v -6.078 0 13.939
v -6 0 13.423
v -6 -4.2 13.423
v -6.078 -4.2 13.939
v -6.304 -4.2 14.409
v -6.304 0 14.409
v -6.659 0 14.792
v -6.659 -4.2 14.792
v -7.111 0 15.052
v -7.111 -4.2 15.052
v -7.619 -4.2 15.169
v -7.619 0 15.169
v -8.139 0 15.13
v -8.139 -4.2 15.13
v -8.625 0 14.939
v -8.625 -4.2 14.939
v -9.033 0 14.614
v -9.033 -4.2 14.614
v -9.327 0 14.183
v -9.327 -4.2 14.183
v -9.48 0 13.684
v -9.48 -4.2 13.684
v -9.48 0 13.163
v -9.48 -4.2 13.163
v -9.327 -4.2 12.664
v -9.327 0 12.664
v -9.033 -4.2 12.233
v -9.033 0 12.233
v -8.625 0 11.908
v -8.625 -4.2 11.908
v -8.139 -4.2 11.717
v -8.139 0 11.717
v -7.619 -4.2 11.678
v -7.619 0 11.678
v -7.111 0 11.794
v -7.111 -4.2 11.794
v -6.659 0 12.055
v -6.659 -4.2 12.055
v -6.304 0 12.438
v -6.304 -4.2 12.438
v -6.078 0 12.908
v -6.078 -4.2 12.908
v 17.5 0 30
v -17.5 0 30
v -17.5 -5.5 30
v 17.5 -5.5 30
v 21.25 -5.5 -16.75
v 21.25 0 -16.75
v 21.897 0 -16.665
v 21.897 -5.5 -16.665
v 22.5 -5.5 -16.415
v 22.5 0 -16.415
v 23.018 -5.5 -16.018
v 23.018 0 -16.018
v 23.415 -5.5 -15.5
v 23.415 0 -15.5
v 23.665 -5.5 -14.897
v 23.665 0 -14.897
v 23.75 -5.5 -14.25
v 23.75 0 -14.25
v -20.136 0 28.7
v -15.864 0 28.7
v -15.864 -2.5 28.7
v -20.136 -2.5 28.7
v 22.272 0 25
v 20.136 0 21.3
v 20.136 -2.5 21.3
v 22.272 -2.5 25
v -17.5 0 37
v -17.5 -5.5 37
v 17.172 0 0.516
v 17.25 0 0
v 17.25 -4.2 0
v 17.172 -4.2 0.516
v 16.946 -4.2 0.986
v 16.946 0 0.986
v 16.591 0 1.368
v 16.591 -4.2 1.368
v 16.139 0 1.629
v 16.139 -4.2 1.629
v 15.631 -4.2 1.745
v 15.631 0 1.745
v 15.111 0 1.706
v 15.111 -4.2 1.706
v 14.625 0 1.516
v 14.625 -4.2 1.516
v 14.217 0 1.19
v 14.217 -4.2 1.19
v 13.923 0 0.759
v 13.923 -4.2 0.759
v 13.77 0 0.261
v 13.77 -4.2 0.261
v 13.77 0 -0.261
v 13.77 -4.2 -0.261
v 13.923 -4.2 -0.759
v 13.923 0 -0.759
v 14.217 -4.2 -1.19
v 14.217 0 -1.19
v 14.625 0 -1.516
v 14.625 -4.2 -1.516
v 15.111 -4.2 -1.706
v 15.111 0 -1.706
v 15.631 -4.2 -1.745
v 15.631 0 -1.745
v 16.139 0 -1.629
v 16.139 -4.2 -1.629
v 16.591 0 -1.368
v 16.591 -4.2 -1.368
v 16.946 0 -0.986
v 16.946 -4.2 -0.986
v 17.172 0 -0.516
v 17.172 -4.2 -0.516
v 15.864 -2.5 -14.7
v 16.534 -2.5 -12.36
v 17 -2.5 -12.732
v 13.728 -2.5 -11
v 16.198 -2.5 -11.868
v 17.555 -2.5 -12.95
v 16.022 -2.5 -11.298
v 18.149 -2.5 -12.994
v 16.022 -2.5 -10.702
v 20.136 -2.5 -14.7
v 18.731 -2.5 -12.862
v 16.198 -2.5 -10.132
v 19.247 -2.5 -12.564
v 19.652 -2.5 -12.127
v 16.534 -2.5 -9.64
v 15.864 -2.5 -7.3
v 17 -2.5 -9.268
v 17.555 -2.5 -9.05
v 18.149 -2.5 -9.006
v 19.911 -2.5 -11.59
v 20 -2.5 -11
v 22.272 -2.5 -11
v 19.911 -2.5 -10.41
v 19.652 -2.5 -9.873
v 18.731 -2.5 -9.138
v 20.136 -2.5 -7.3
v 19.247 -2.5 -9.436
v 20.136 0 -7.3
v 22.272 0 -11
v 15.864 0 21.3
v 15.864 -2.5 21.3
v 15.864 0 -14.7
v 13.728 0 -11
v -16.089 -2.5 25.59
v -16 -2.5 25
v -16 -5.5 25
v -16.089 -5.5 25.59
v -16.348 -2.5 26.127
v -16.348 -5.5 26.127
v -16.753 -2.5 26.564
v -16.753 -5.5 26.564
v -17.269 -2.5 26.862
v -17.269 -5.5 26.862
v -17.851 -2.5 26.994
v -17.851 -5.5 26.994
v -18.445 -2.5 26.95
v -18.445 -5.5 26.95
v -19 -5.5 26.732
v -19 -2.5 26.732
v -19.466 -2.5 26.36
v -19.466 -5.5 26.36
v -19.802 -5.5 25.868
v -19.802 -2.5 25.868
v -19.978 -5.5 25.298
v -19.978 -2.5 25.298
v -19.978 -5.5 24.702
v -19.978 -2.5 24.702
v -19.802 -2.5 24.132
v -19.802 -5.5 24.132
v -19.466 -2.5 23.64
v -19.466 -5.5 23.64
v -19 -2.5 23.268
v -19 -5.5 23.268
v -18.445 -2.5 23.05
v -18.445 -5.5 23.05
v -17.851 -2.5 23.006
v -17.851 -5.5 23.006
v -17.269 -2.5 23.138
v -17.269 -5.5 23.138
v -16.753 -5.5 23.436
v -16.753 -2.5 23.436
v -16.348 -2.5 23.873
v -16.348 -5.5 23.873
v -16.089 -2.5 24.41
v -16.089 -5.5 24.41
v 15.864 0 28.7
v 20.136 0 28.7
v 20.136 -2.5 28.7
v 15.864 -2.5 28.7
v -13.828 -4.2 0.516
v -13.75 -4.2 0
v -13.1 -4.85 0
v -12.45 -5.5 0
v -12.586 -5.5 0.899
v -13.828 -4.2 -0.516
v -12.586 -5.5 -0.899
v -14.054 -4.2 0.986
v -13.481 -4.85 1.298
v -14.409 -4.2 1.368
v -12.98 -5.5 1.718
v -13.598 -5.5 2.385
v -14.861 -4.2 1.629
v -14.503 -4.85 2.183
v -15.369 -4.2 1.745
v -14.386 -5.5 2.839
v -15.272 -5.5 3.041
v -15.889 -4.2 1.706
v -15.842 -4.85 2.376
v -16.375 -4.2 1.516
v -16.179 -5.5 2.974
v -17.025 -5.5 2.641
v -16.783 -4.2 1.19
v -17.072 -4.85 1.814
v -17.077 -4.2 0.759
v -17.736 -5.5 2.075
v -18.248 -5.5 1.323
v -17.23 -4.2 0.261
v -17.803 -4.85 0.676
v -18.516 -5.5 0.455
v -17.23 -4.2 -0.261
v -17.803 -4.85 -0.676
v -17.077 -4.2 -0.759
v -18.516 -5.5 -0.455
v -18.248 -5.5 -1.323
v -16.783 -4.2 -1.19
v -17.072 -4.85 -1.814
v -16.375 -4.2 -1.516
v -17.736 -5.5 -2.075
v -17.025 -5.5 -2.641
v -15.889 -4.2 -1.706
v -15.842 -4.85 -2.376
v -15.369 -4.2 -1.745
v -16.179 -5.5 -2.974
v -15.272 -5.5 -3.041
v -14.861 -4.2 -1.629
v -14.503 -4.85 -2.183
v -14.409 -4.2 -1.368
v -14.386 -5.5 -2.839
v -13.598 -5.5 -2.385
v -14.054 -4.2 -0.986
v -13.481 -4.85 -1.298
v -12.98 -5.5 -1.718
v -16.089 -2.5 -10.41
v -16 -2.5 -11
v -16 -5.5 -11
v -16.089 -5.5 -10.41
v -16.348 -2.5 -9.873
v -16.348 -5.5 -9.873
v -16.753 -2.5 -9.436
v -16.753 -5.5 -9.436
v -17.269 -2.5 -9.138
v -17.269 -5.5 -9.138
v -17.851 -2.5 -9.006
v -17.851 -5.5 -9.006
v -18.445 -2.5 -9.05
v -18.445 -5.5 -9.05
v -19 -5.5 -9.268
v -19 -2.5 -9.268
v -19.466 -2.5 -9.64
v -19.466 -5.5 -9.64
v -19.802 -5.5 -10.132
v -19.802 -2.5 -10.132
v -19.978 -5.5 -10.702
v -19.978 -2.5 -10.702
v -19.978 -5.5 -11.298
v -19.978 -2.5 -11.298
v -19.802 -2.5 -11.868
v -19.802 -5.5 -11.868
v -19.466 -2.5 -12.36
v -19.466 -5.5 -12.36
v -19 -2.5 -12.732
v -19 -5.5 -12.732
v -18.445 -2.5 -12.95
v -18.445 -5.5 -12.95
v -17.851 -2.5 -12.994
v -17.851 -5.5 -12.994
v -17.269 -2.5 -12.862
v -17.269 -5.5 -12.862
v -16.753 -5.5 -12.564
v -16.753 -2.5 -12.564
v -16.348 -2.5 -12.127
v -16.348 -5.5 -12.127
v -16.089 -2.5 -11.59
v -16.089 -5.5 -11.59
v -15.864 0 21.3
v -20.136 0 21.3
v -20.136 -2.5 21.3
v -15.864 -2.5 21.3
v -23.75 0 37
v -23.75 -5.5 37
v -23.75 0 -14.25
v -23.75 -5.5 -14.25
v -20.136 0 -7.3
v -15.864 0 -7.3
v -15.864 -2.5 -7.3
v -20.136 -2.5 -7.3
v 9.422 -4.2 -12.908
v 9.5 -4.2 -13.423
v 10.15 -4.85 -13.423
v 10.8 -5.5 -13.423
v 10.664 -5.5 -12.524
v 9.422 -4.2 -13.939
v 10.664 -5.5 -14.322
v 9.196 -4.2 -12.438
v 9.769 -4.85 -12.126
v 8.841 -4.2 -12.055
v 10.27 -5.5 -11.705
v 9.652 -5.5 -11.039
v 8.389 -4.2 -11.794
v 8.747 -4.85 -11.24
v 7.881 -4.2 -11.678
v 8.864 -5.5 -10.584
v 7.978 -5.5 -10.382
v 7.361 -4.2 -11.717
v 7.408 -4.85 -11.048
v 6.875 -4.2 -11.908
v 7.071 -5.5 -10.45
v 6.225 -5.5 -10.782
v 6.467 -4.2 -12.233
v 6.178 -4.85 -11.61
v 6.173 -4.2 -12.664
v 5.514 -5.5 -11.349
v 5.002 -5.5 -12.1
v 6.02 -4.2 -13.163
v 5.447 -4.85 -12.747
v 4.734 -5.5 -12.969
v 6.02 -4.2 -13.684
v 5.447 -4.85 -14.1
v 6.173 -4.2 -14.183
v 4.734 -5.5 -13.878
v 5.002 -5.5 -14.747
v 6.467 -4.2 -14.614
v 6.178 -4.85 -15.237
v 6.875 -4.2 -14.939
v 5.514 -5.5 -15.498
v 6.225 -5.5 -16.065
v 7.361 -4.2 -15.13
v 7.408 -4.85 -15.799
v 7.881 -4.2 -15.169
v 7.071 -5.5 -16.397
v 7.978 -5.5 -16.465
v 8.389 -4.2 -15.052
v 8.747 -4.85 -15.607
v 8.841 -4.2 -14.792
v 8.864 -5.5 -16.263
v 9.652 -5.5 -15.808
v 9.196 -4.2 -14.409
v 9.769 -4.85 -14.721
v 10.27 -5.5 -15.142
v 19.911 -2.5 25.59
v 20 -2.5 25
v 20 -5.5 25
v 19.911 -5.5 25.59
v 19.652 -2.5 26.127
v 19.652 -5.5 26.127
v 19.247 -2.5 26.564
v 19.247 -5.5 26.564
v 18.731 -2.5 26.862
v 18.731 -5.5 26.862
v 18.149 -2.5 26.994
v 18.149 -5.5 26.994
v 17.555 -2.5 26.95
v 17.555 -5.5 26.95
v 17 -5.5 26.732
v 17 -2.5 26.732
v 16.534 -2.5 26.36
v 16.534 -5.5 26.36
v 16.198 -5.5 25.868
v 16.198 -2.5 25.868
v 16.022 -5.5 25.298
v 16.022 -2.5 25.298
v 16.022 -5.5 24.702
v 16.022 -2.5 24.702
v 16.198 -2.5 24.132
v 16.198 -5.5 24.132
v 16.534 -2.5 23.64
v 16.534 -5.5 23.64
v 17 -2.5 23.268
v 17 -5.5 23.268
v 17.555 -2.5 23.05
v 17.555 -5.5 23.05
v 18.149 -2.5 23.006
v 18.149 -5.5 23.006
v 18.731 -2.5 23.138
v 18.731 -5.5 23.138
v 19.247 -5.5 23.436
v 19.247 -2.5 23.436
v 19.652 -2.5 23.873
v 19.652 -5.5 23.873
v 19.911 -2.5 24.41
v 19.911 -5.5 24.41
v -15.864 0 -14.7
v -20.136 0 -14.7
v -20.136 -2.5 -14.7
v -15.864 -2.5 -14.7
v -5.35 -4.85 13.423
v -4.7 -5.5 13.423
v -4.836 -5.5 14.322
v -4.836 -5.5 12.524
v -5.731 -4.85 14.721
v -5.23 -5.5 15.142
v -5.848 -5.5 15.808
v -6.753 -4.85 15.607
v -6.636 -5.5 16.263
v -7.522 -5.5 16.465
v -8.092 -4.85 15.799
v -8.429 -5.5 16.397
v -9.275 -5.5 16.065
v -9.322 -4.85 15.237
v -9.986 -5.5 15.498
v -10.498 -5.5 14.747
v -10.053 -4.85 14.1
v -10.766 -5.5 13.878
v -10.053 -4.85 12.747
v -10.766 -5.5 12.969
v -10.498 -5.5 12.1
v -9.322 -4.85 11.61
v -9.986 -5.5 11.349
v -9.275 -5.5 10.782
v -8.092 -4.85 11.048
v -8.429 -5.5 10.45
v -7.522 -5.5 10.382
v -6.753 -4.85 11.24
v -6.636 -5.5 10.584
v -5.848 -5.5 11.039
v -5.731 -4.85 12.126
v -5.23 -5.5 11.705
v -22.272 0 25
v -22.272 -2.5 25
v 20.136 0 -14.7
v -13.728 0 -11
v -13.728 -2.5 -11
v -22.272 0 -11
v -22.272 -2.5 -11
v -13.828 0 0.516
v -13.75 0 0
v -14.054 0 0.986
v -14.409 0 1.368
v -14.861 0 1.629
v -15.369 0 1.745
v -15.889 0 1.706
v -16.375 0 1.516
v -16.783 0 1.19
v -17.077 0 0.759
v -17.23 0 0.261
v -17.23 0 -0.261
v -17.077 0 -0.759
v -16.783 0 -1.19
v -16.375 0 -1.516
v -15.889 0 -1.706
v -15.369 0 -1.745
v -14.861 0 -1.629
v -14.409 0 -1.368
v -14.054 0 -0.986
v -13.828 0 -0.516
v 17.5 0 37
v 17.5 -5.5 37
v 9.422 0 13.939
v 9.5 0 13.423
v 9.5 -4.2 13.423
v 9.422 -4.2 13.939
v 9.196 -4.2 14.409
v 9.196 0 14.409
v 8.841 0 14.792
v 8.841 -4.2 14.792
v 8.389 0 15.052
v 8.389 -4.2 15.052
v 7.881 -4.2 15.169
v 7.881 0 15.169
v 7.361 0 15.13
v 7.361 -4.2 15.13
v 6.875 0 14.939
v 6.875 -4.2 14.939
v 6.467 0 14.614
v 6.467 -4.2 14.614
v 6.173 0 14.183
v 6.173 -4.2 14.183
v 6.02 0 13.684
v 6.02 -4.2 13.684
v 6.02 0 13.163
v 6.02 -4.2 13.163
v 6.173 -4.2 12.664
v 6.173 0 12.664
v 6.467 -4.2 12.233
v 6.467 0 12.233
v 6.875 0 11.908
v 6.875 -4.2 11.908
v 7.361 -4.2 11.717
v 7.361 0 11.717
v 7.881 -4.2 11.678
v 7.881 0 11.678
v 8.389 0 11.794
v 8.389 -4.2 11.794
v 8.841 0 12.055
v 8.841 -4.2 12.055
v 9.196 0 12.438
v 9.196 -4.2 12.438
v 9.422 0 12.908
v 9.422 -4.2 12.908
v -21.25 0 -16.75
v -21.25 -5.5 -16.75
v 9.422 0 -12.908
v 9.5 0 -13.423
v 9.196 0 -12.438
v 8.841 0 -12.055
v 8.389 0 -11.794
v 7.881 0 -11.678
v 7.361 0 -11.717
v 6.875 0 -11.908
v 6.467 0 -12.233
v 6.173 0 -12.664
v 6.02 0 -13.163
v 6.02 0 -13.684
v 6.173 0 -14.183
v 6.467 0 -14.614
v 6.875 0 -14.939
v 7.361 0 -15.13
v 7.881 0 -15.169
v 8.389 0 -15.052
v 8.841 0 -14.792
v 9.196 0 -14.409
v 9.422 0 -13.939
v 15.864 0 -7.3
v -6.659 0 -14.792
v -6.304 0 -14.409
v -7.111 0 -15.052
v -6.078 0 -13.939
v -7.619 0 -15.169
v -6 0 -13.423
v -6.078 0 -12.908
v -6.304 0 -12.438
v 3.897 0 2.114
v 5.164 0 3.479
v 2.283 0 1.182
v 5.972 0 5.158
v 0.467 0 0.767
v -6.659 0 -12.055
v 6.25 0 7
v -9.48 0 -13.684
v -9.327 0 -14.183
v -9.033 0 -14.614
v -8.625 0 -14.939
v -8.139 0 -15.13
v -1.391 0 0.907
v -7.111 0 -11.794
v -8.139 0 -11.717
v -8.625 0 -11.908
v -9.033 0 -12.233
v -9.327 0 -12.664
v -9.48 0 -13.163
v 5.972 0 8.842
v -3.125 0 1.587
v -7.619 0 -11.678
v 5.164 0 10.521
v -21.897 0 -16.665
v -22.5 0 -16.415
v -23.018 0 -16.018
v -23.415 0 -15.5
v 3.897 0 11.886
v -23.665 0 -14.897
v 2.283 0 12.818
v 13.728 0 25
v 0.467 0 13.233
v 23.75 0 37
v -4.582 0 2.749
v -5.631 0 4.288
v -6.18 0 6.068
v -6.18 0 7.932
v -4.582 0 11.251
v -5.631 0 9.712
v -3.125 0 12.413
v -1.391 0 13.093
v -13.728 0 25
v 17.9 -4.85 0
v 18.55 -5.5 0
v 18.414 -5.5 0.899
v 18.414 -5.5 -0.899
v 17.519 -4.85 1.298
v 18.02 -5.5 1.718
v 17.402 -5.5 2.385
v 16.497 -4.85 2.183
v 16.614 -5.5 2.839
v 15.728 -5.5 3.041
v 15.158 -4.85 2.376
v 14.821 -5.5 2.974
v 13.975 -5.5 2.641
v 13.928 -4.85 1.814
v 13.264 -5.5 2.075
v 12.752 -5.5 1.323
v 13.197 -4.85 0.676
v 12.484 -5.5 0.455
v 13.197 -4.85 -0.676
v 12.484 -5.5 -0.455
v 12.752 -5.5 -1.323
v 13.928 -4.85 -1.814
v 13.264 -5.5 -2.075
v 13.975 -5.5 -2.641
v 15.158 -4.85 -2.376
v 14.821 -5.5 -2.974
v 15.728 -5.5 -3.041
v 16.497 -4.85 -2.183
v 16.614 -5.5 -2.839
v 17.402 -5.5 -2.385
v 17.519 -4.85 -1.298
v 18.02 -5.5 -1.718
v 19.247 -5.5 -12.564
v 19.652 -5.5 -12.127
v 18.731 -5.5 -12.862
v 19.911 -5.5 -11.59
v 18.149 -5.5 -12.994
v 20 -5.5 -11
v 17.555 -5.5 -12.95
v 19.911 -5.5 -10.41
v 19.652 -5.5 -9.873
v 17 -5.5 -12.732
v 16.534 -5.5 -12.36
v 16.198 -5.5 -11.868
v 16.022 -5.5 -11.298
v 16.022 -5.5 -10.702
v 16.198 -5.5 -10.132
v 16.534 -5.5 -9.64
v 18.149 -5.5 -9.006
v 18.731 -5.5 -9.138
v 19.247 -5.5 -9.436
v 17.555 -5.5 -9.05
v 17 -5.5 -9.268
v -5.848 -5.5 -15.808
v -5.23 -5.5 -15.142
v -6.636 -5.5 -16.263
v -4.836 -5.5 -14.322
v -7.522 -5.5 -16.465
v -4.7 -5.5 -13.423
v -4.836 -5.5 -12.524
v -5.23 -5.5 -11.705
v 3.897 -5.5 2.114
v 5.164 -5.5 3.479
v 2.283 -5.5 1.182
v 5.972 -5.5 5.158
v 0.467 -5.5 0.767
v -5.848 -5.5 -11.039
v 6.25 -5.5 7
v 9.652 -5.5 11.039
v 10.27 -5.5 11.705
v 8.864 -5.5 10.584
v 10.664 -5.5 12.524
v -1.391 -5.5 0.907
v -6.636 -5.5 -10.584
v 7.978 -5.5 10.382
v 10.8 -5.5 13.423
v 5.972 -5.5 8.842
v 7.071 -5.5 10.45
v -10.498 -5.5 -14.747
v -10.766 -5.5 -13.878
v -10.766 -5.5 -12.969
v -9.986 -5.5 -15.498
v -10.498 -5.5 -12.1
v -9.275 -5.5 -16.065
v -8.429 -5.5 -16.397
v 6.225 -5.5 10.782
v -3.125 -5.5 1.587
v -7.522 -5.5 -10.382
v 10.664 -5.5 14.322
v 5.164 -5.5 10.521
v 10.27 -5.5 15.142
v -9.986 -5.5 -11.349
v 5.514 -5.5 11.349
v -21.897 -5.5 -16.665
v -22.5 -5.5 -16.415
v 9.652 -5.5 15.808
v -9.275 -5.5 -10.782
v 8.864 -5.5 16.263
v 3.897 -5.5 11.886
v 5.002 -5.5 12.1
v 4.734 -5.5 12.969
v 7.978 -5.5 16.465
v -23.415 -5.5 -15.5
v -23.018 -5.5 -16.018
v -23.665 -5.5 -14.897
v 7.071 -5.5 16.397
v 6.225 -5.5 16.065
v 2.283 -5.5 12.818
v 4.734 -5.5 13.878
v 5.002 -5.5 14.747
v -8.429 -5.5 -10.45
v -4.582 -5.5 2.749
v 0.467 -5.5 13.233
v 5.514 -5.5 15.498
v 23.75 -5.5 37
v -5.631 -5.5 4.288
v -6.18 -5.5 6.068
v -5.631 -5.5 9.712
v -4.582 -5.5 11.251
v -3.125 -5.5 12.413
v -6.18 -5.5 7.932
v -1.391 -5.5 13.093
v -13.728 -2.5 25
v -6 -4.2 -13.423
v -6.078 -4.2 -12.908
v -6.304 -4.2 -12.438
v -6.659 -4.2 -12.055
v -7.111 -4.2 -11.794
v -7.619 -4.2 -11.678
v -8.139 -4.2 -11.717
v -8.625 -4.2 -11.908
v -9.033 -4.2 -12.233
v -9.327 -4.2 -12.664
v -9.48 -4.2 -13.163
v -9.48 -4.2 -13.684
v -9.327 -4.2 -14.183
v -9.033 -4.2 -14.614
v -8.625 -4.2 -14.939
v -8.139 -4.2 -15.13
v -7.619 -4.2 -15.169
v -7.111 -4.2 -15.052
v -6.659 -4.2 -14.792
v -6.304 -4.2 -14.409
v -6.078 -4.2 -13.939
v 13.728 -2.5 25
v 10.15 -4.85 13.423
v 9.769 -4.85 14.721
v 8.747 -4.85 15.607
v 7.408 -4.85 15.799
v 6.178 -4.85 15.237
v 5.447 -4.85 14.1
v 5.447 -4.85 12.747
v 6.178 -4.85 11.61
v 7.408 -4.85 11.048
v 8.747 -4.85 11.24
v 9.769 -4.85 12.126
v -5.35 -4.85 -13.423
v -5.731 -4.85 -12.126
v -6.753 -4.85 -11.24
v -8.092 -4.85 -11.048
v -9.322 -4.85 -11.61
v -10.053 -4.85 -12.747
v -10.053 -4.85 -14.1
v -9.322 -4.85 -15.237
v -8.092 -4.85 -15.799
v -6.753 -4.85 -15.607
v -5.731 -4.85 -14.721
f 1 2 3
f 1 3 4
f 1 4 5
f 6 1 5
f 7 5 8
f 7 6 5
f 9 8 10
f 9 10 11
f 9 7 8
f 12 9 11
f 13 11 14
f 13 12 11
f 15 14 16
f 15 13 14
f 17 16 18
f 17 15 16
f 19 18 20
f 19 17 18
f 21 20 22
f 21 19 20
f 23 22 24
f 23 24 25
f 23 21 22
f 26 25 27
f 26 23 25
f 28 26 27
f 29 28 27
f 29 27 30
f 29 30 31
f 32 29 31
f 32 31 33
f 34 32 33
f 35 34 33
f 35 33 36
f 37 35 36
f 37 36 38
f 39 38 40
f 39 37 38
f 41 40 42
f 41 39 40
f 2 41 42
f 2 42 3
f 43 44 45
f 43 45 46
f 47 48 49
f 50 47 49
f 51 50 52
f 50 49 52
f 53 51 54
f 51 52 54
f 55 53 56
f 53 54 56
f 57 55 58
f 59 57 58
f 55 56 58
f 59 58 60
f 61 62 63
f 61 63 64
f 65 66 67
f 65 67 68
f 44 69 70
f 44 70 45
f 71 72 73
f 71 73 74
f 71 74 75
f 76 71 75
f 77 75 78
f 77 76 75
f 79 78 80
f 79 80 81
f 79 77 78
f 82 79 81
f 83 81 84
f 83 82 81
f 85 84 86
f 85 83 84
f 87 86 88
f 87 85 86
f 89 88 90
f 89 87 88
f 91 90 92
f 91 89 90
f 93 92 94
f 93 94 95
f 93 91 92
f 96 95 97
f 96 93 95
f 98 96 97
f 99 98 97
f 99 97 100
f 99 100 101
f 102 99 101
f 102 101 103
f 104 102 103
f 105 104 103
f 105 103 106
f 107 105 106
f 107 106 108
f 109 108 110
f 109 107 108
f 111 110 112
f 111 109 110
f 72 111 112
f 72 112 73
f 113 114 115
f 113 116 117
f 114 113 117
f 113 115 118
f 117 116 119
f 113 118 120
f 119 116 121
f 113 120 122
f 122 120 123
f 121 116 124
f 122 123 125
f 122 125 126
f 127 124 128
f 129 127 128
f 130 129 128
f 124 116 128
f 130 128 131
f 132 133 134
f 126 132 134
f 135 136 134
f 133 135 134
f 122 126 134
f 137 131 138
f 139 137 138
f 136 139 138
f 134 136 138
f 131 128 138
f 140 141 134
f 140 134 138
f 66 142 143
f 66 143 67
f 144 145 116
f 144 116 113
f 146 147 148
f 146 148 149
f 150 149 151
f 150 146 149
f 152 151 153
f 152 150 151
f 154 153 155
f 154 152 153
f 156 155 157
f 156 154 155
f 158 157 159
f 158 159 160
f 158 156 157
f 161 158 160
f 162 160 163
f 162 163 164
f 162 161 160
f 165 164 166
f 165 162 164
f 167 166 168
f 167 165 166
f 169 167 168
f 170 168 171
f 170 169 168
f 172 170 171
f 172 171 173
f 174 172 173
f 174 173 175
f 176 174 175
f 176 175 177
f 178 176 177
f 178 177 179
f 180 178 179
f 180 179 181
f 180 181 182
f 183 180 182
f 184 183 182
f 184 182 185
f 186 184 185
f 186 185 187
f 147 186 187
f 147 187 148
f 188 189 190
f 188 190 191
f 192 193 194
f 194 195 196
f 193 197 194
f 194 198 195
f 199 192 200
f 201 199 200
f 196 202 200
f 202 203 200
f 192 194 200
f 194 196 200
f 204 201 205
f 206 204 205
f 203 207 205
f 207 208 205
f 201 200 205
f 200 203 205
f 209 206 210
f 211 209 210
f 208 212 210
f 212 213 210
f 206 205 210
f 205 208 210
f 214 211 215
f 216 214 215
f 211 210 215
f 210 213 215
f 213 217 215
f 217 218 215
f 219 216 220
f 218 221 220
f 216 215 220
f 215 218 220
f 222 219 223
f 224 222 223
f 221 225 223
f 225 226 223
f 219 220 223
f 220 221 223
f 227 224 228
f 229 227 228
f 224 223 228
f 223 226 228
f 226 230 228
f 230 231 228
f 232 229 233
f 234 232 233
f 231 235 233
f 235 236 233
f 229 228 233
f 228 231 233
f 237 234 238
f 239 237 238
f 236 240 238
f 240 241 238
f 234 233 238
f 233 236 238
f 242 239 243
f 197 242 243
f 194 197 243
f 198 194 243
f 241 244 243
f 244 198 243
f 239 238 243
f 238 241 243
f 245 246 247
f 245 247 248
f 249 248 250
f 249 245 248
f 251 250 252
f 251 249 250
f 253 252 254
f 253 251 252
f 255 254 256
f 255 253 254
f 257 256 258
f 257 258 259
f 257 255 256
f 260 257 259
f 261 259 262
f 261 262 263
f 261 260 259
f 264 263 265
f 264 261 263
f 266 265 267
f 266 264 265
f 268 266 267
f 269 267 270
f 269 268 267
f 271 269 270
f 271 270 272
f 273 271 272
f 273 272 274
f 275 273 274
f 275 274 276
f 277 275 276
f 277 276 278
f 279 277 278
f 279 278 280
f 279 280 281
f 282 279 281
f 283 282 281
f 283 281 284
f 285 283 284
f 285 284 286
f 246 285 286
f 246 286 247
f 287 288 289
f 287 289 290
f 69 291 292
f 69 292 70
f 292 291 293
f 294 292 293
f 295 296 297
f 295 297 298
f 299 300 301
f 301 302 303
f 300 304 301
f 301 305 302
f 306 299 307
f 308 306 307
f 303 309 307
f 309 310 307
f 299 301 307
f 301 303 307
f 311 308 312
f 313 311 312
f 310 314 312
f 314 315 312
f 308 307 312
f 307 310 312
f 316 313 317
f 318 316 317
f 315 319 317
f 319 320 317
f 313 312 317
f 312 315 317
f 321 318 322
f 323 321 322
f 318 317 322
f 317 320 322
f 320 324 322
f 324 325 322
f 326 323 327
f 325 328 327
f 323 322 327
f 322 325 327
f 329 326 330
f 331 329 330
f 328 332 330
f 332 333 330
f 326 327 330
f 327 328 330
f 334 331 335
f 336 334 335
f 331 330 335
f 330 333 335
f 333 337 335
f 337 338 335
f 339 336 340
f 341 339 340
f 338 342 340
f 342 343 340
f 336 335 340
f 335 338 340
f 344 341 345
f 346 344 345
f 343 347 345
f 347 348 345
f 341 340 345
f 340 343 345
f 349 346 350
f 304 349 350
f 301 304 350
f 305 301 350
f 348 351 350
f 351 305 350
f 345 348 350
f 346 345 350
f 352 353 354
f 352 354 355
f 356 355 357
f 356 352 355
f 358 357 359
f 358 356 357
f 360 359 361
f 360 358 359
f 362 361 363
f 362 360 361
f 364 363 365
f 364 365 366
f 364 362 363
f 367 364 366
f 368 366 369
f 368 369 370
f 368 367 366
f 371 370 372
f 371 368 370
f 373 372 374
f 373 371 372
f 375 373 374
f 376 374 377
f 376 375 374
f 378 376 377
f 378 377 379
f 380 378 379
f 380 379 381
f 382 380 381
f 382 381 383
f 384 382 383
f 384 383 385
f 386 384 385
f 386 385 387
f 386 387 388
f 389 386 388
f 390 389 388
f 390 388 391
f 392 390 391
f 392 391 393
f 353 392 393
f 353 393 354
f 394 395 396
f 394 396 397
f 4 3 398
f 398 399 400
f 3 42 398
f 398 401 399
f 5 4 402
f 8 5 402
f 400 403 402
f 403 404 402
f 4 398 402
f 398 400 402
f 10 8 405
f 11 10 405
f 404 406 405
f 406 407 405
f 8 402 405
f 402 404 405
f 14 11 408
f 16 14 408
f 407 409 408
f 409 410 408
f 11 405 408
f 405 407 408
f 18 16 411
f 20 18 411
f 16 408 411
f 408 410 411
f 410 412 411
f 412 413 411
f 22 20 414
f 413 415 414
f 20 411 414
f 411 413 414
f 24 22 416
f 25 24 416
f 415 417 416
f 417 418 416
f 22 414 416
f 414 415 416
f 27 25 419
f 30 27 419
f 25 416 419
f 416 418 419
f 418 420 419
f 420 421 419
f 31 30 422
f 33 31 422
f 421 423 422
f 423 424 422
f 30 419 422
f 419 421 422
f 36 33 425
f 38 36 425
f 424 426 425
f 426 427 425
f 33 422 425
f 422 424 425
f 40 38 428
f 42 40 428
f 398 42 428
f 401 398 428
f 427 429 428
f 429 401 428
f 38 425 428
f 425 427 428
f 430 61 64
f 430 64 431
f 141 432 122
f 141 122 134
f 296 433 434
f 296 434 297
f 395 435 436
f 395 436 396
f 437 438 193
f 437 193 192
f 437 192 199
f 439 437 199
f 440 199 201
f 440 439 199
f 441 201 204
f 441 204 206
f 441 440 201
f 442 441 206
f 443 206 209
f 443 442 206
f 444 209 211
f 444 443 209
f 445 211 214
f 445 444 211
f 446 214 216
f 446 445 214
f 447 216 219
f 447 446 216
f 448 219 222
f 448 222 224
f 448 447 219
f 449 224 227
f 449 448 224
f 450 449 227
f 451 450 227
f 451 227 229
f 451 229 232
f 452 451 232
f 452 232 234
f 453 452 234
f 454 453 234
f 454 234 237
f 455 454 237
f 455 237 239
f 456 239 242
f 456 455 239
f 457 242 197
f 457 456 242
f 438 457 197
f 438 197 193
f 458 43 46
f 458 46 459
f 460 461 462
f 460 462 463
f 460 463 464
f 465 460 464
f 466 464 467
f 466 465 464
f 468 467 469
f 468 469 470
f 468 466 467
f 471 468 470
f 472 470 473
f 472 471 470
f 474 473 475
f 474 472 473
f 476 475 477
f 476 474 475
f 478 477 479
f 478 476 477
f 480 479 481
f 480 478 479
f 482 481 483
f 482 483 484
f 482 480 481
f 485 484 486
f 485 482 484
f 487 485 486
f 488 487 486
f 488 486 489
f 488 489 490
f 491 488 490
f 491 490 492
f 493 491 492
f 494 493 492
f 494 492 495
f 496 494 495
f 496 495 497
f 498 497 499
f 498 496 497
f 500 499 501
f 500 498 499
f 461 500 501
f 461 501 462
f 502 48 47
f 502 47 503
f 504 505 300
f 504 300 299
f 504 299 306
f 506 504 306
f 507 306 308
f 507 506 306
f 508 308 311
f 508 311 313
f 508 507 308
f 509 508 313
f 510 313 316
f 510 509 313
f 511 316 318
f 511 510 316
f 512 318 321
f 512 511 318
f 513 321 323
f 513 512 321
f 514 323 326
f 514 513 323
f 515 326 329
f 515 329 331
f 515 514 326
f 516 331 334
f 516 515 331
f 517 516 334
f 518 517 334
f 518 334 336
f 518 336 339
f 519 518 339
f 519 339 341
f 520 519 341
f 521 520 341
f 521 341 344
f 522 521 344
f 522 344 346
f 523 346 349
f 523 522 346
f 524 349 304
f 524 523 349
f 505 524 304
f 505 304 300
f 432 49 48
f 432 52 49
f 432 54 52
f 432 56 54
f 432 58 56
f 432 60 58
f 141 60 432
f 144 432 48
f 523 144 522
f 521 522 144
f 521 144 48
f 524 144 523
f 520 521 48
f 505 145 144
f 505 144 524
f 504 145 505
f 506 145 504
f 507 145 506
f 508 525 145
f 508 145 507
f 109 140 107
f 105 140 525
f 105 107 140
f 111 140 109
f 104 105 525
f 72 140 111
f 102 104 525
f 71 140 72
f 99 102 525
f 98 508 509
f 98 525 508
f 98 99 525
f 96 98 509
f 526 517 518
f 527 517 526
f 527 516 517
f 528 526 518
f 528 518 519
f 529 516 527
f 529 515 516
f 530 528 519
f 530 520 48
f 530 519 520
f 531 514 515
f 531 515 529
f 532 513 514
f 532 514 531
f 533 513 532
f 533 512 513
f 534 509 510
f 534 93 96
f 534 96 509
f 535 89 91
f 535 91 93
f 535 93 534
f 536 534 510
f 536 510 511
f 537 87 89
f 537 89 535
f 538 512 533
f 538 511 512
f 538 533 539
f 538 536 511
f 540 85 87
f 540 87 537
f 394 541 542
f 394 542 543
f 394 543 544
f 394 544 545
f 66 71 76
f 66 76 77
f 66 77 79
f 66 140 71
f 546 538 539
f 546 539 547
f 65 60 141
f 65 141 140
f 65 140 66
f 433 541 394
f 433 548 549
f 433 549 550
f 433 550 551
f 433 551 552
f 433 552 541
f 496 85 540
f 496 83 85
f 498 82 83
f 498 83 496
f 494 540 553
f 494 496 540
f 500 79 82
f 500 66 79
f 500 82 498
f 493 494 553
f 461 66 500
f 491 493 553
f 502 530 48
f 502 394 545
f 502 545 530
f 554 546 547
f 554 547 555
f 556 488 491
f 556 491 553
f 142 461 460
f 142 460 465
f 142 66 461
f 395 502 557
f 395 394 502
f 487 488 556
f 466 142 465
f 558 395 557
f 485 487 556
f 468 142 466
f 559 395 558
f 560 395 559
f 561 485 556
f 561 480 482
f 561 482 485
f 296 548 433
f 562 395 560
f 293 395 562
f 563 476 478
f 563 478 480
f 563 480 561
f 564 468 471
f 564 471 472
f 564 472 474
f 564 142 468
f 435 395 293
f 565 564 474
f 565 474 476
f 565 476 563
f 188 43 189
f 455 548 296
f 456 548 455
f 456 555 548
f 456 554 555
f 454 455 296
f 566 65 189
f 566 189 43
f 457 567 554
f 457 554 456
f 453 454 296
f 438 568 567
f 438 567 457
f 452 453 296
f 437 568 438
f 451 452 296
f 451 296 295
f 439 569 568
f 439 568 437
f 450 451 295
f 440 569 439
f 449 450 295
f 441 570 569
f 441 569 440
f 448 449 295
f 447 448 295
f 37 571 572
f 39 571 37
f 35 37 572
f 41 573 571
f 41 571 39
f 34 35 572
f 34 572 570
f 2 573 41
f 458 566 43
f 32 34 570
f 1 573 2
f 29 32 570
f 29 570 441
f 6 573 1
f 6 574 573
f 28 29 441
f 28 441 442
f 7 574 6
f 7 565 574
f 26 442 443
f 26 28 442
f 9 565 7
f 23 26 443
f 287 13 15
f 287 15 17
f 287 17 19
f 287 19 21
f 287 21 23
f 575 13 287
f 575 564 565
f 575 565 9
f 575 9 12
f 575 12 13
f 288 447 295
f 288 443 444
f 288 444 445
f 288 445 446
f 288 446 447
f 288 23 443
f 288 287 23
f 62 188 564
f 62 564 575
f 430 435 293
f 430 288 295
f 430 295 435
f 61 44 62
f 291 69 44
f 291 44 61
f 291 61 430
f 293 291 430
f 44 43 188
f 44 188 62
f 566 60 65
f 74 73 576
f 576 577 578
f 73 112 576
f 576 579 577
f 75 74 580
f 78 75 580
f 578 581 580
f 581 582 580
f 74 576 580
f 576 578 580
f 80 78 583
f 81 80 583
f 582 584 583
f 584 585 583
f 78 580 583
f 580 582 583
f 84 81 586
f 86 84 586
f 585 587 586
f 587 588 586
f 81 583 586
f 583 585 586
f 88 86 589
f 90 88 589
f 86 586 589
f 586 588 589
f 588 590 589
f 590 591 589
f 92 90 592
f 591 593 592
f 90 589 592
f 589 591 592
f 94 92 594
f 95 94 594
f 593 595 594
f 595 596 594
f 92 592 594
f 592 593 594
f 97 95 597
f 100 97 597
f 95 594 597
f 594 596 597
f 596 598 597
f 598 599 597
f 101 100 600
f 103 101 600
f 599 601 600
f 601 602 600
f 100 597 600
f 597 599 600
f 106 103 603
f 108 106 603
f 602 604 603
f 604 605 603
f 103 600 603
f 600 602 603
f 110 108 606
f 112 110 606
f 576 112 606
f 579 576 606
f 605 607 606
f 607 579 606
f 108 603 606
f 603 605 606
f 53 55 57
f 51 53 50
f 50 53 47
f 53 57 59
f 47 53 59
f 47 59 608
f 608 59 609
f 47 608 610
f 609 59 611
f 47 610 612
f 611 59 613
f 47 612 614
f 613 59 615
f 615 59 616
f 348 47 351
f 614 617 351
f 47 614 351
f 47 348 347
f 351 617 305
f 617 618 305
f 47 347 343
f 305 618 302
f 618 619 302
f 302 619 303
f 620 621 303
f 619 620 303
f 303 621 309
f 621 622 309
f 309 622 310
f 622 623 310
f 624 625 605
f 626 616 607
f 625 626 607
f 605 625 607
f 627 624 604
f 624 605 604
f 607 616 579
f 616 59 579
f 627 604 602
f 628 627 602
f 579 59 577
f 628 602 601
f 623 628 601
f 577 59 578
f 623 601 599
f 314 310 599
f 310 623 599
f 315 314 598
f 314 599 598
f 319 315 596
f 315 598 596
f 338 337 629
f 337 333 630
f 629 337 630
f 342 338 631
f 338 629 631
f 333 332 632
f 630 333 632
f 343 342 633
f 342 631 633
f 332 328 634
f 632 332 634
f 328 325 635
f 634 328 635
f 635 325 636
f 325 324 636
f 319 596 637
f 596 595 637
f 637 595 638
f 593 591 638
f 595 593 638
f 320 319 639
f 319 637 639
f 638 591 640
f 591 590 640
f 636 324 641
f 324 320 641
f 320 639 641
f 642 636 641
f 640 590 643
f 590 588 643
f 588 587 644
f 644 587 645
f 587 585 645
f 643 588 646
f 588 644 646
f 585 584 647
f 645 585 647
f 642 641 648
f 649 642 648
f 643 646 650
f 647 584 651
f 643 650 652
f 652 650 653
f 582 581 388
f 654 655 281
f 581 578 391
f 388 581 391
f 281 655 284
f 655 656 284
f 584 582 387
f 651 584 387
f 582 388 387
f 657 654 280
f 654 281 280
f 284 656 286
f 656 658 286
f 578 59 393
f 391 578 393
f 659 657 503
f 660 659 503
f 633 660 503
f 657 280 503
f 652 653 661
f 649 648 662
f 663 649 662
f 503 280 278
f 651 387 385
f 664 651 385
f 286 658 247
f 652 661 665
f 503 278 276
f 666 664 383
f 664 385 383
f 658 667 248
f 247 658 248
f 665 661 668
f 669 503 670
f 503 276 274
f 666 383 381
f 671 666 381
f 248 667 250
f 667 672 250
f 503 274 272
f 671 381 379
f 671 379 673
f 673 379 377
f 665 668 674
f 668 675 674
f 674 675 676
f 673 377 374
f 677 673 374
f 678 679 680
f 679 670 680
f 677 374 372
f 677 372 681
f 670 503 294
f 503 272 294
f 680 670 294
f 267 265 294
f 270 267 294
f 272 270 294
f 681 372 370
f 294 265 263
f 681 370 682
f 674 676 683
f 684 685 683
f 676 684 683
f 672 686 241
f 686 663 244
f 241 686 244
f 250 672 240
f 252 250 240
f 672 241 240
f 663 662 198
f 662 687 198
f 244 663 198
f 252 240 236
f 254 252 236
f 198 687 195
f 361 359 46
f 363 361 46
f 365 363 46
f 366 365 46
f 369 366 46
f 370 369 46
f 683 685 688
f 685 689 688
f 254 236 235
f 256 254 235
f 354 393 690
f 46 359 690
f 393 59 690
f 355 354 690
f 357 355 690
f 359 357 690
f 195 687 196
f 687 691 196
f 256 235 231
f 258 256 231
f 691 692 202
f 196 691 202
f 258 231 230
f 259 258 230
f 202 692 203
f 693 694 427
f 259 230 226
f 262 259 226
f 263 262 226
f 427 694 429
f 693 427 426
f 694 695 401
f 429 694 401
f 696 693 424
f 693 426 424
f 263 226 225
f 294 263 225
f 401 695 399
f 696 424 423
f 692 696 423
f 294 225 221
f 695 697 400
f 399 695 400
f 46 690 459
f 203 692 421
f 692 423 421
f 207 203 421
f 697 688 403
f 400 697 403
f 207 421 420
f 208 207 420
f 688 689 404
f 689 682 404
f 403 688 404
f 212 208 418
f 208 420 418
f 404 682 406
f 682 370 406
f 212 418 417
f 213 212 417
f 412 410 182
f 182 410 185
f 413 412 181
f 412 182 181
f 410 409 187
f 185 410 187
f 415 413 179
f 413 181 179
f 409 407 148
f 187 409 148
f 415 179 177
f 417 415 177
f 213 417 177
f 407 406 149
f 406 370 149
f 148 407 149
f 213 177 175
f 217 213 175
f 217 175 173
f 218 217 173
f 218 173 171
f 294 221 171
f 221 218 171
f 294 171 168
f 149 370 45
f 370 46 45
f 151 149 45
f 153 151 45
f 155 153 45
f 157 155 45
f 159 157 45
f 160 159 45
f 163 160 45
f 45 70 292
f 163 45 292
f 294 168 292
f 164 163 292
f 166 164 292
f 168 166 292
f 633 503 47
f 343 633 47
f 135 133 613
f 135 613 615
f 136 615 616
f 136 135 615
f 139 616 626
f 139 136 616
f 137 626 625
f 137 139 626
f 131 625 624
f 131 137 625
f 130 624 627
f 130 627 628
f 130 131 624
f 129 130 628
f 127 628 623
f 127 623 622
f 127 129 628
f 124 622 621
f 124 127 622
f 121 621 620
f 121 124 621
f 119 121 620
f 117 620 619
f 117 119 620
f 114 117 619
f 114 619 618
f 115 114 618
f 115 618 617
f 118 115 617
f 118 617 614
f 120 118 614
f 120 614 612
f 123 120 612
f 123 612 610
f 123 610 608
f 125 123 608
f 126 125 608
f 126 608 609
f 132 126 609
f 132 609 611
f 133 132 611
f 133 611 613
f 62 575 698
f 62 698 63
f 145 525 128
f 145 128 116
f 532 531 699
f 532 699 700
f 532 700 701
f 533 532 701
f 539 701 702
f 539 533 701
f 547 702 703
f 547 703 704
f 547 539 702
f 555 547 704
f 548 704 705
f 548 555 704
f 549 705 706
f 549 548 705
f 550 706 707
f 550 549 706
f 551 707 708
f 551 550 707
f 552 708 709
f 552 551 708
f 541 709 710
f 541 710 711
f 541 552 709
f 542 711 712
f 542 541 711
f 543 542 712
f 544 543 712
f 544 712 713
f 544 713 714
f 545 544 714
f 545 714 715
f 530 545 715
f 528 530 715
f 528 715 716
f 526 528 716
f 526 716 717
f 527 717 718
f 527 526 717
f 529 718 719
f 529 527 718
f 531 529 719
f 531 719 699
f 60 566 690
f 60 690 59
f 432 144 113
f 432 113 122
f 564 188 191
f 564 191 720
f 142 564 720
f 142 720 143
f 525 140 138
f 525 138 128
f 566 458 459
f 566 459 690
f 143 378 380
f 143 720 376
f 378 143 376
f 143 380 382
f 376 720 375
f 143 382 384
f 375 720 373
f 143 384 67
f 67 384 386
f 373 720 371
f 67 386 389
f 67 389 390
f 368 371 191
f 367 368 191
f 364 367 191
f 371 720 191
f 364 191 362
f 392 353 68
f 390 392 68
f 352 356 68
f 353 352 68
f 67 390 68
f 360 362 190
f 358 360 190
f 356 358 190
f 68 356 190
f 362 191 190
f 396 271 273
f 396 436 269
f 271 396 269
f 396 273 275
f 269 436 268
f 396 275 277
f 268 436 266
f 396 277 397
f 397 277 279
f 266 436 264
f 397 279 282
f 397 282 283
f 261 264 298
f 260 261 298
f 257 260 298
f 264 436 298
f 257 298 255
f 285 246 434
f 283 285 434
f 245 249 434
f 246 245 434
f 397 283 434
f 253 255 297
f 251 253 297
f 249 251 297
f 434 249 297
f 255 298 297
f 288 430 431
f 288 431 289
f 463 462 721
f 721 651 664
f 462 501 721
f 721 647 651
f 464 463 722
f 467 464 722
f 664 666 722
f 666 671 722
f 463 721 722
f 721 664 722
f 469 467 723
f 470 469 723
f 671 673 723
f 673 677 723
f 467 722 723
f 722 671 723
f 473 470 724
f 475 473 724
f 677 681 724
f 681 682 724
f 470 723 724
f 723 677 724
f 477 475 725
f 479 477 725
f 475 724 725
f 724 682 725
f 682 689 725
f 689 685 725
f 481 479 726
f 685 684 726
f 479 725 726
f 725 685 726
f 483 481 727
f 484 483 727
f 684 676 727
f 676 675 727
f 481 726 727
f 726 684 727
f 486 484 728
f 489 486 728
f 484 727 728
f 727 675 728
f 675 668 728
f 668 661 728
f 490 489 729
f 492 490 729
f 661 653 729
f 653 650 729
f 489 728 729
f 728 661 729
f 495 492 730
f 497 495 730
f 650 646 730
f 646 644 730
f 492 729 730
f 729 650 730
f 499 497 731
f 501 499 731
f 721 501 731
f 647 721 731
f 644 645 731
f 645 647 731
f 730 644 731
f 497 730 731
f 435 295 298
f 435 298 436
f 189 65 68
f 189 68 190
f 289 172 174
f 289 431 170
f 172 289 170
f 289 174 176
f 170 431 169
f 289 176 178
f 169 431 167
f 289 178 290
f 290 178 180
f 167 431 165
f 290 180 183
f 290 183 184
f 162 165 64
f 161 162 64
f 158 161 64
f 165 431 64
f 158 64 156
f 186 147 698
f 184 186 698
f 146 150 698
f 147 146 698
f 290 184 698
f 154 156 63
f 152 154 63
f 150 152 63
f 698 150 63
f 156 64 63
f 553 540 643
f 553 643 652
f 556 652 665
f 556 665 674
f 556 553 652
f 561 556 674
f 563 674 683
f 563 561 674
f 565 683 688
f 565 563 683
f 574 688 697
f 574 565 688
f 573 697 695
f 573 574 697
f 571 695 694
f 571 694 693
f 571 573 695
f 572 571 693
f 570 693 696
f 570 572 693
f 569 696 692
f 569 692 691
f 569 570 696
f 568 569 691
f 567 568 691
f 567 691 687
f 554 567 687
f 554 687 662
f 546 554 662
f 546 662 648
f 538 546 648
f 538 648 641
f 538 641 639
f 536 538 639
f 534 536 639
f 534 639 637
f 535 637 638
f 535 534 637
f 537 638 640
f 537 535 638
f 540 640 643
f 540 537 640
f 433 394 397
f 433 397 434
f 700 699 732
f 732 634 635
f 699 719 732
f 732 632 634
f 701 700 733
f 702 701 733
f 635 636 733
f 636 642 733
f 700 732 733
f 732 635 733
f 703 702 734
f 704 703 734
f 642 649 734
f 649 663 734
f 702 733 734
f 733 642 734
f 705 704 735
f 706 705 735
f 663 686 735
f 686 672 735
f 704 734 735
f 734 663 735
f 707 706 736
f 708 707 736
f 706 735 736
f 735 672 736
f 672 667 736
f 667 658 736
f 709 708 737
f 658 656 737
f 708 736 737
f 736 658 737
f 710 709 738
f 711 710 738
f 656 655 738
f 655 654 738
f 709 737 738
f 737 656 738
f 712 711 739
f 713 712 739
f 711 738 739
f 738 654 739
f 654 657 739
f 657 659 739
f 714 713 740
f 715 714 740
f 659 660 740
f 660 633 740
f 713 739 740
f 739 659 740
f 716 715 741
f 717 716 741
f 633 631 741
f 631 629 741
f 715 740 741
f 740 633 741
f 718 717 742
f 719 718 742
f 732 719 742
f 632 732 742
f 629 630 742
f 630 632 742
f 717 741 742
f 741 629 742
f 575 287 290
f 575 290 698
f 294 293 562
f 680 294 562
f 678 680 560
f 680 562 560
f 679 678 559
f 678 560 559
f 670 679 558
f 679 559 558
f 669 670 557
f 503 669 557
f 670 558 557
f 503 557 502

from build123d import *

# Parameters (mm, degrees)
SKETCH_R     = 6.25
SKETCH_R_2   = 1.75
SKETCH_R_3   = 2
PAD_DEPTH    = 5.5
CHAMFER_SIZE = 1.3
POCKET_DEPTH = 2.5


with BuildPart() as part:
    # Sketch → Pad (new body)
    with BuildSketch(Plane.XZ):
        with BuildLine():
            Line((21.25, -16.75), (-21.25, -16.75))
            ThreePointArc((-23.75, -14.25), (-23.017767, -16.017767), (-21.25, -16.75))
            Line((-23.75, 37), (-23.75, -14.25))
            Line((-23.75, 37), (-17.5, 37))
            Line((-17.5, 37), (-17.5, 30))
            Line((-17.5, 30), (17.5, 30))
            Line((17.5, 30), (17.5, 37))
            Line((17.5, 37), (23.75, 37))
            Line((23.75, 37), (23.75, -14.25))
            ThreePointArc((21.25, -16.75), (23.017767, -16.017767), (23.75, -14.25))
        make_face()
        with Locations((0, 7)):
            Circle(SKETCH_R, mode=Mode.SUBTRACT)
        with Locations((-7.75, 13.423394)):
            Circle(SKETCH_R_2, mode=Mode.SUBTRACT)
        with Locations((-15.5, 0)):
            Circle(SKETCH_R_2, mode=Mode.SUBTRACT)
        with Locations((-7.75, -13.423394)):
            Circle(SKETCH_R_2, mode=Mode.SUBTRACT)
        with Locations((7.75, -13.423394)):
            Circle(SKETCH_R_2, mode=Mode.SUBTRACT)
        with Locations((15.5, 0)):
            Circle(SKETCH_R_2, mode=Mode.SUBTRACT)
        with Locations((7.75, 13.423394)):
            Circle(SKETCH_R_2, mode=Mode.SUBTRACT)
        with Locations((-18, 25)):
            Circle(SKETCH_R_3, mode=Mode.SUBTRACT)
        with Locations((18, 25)):
            Circle(SKETCH_R_3, mode=Mode.SUBTRACT)
        with Locations((18, -11)):
            Circle(SKETCH_R_3, mode=Mode.SUBTRACT)
        with Locations((-18, -11)):
            Circle(SKETCH_R_3, mode=Mode.SUBTRACT)
    extrude(amount=PAD_DEPTH)

    # Chamfer
    chamfer_edges = [part.edges().sort_by_distance(p)[0] for p in [
        (-9.5, -5.5, 13.423394),
        (13.75, -5.5, 0),
        (6, -5.5, 13.423394),
        (-17.25, -5.5, 0),
        (6, -5.5, -13.423394),
        (-9.5, -5.5, -13.423394),
    ]]
    chamfer(chamfer_edges, length=CHAMFER_SIZE)

    # Sketch001 → Pocket (cut)
    with BuildSketch(Plane.XZ):
        Polygon((-15.863804, 28.7), (-20.136196, 28.7), (-22.272392, 25), (-20.136196, 21.3), (-15.863804, 21.3), (-13.727608, 25), align=None)
        Polygon((20.136196, 28.7), (15.863804, 28.7), (13.727608, 25), (15.863804, 21.3), (20.136196, 21.3), (22.272392, 25), align=None)
        Polygon((20.136196, -7.3), (15.863804, -7.3), (13.727608, -11), (15.863804, -14.7), (20.136196, -14.7), (22.272392, -11), align=None)
        Polygon((-15.863804, -7.3), (-20.136196, -7.3), (-22.272392, -11), (-20.136196, -14.7), (-15.863804, -14.7), (-13.727608, -11), align=None)
    extrude(amount=POCKET_DEPTH, mode=Mode.SUBTRACT)


solid = part.part
